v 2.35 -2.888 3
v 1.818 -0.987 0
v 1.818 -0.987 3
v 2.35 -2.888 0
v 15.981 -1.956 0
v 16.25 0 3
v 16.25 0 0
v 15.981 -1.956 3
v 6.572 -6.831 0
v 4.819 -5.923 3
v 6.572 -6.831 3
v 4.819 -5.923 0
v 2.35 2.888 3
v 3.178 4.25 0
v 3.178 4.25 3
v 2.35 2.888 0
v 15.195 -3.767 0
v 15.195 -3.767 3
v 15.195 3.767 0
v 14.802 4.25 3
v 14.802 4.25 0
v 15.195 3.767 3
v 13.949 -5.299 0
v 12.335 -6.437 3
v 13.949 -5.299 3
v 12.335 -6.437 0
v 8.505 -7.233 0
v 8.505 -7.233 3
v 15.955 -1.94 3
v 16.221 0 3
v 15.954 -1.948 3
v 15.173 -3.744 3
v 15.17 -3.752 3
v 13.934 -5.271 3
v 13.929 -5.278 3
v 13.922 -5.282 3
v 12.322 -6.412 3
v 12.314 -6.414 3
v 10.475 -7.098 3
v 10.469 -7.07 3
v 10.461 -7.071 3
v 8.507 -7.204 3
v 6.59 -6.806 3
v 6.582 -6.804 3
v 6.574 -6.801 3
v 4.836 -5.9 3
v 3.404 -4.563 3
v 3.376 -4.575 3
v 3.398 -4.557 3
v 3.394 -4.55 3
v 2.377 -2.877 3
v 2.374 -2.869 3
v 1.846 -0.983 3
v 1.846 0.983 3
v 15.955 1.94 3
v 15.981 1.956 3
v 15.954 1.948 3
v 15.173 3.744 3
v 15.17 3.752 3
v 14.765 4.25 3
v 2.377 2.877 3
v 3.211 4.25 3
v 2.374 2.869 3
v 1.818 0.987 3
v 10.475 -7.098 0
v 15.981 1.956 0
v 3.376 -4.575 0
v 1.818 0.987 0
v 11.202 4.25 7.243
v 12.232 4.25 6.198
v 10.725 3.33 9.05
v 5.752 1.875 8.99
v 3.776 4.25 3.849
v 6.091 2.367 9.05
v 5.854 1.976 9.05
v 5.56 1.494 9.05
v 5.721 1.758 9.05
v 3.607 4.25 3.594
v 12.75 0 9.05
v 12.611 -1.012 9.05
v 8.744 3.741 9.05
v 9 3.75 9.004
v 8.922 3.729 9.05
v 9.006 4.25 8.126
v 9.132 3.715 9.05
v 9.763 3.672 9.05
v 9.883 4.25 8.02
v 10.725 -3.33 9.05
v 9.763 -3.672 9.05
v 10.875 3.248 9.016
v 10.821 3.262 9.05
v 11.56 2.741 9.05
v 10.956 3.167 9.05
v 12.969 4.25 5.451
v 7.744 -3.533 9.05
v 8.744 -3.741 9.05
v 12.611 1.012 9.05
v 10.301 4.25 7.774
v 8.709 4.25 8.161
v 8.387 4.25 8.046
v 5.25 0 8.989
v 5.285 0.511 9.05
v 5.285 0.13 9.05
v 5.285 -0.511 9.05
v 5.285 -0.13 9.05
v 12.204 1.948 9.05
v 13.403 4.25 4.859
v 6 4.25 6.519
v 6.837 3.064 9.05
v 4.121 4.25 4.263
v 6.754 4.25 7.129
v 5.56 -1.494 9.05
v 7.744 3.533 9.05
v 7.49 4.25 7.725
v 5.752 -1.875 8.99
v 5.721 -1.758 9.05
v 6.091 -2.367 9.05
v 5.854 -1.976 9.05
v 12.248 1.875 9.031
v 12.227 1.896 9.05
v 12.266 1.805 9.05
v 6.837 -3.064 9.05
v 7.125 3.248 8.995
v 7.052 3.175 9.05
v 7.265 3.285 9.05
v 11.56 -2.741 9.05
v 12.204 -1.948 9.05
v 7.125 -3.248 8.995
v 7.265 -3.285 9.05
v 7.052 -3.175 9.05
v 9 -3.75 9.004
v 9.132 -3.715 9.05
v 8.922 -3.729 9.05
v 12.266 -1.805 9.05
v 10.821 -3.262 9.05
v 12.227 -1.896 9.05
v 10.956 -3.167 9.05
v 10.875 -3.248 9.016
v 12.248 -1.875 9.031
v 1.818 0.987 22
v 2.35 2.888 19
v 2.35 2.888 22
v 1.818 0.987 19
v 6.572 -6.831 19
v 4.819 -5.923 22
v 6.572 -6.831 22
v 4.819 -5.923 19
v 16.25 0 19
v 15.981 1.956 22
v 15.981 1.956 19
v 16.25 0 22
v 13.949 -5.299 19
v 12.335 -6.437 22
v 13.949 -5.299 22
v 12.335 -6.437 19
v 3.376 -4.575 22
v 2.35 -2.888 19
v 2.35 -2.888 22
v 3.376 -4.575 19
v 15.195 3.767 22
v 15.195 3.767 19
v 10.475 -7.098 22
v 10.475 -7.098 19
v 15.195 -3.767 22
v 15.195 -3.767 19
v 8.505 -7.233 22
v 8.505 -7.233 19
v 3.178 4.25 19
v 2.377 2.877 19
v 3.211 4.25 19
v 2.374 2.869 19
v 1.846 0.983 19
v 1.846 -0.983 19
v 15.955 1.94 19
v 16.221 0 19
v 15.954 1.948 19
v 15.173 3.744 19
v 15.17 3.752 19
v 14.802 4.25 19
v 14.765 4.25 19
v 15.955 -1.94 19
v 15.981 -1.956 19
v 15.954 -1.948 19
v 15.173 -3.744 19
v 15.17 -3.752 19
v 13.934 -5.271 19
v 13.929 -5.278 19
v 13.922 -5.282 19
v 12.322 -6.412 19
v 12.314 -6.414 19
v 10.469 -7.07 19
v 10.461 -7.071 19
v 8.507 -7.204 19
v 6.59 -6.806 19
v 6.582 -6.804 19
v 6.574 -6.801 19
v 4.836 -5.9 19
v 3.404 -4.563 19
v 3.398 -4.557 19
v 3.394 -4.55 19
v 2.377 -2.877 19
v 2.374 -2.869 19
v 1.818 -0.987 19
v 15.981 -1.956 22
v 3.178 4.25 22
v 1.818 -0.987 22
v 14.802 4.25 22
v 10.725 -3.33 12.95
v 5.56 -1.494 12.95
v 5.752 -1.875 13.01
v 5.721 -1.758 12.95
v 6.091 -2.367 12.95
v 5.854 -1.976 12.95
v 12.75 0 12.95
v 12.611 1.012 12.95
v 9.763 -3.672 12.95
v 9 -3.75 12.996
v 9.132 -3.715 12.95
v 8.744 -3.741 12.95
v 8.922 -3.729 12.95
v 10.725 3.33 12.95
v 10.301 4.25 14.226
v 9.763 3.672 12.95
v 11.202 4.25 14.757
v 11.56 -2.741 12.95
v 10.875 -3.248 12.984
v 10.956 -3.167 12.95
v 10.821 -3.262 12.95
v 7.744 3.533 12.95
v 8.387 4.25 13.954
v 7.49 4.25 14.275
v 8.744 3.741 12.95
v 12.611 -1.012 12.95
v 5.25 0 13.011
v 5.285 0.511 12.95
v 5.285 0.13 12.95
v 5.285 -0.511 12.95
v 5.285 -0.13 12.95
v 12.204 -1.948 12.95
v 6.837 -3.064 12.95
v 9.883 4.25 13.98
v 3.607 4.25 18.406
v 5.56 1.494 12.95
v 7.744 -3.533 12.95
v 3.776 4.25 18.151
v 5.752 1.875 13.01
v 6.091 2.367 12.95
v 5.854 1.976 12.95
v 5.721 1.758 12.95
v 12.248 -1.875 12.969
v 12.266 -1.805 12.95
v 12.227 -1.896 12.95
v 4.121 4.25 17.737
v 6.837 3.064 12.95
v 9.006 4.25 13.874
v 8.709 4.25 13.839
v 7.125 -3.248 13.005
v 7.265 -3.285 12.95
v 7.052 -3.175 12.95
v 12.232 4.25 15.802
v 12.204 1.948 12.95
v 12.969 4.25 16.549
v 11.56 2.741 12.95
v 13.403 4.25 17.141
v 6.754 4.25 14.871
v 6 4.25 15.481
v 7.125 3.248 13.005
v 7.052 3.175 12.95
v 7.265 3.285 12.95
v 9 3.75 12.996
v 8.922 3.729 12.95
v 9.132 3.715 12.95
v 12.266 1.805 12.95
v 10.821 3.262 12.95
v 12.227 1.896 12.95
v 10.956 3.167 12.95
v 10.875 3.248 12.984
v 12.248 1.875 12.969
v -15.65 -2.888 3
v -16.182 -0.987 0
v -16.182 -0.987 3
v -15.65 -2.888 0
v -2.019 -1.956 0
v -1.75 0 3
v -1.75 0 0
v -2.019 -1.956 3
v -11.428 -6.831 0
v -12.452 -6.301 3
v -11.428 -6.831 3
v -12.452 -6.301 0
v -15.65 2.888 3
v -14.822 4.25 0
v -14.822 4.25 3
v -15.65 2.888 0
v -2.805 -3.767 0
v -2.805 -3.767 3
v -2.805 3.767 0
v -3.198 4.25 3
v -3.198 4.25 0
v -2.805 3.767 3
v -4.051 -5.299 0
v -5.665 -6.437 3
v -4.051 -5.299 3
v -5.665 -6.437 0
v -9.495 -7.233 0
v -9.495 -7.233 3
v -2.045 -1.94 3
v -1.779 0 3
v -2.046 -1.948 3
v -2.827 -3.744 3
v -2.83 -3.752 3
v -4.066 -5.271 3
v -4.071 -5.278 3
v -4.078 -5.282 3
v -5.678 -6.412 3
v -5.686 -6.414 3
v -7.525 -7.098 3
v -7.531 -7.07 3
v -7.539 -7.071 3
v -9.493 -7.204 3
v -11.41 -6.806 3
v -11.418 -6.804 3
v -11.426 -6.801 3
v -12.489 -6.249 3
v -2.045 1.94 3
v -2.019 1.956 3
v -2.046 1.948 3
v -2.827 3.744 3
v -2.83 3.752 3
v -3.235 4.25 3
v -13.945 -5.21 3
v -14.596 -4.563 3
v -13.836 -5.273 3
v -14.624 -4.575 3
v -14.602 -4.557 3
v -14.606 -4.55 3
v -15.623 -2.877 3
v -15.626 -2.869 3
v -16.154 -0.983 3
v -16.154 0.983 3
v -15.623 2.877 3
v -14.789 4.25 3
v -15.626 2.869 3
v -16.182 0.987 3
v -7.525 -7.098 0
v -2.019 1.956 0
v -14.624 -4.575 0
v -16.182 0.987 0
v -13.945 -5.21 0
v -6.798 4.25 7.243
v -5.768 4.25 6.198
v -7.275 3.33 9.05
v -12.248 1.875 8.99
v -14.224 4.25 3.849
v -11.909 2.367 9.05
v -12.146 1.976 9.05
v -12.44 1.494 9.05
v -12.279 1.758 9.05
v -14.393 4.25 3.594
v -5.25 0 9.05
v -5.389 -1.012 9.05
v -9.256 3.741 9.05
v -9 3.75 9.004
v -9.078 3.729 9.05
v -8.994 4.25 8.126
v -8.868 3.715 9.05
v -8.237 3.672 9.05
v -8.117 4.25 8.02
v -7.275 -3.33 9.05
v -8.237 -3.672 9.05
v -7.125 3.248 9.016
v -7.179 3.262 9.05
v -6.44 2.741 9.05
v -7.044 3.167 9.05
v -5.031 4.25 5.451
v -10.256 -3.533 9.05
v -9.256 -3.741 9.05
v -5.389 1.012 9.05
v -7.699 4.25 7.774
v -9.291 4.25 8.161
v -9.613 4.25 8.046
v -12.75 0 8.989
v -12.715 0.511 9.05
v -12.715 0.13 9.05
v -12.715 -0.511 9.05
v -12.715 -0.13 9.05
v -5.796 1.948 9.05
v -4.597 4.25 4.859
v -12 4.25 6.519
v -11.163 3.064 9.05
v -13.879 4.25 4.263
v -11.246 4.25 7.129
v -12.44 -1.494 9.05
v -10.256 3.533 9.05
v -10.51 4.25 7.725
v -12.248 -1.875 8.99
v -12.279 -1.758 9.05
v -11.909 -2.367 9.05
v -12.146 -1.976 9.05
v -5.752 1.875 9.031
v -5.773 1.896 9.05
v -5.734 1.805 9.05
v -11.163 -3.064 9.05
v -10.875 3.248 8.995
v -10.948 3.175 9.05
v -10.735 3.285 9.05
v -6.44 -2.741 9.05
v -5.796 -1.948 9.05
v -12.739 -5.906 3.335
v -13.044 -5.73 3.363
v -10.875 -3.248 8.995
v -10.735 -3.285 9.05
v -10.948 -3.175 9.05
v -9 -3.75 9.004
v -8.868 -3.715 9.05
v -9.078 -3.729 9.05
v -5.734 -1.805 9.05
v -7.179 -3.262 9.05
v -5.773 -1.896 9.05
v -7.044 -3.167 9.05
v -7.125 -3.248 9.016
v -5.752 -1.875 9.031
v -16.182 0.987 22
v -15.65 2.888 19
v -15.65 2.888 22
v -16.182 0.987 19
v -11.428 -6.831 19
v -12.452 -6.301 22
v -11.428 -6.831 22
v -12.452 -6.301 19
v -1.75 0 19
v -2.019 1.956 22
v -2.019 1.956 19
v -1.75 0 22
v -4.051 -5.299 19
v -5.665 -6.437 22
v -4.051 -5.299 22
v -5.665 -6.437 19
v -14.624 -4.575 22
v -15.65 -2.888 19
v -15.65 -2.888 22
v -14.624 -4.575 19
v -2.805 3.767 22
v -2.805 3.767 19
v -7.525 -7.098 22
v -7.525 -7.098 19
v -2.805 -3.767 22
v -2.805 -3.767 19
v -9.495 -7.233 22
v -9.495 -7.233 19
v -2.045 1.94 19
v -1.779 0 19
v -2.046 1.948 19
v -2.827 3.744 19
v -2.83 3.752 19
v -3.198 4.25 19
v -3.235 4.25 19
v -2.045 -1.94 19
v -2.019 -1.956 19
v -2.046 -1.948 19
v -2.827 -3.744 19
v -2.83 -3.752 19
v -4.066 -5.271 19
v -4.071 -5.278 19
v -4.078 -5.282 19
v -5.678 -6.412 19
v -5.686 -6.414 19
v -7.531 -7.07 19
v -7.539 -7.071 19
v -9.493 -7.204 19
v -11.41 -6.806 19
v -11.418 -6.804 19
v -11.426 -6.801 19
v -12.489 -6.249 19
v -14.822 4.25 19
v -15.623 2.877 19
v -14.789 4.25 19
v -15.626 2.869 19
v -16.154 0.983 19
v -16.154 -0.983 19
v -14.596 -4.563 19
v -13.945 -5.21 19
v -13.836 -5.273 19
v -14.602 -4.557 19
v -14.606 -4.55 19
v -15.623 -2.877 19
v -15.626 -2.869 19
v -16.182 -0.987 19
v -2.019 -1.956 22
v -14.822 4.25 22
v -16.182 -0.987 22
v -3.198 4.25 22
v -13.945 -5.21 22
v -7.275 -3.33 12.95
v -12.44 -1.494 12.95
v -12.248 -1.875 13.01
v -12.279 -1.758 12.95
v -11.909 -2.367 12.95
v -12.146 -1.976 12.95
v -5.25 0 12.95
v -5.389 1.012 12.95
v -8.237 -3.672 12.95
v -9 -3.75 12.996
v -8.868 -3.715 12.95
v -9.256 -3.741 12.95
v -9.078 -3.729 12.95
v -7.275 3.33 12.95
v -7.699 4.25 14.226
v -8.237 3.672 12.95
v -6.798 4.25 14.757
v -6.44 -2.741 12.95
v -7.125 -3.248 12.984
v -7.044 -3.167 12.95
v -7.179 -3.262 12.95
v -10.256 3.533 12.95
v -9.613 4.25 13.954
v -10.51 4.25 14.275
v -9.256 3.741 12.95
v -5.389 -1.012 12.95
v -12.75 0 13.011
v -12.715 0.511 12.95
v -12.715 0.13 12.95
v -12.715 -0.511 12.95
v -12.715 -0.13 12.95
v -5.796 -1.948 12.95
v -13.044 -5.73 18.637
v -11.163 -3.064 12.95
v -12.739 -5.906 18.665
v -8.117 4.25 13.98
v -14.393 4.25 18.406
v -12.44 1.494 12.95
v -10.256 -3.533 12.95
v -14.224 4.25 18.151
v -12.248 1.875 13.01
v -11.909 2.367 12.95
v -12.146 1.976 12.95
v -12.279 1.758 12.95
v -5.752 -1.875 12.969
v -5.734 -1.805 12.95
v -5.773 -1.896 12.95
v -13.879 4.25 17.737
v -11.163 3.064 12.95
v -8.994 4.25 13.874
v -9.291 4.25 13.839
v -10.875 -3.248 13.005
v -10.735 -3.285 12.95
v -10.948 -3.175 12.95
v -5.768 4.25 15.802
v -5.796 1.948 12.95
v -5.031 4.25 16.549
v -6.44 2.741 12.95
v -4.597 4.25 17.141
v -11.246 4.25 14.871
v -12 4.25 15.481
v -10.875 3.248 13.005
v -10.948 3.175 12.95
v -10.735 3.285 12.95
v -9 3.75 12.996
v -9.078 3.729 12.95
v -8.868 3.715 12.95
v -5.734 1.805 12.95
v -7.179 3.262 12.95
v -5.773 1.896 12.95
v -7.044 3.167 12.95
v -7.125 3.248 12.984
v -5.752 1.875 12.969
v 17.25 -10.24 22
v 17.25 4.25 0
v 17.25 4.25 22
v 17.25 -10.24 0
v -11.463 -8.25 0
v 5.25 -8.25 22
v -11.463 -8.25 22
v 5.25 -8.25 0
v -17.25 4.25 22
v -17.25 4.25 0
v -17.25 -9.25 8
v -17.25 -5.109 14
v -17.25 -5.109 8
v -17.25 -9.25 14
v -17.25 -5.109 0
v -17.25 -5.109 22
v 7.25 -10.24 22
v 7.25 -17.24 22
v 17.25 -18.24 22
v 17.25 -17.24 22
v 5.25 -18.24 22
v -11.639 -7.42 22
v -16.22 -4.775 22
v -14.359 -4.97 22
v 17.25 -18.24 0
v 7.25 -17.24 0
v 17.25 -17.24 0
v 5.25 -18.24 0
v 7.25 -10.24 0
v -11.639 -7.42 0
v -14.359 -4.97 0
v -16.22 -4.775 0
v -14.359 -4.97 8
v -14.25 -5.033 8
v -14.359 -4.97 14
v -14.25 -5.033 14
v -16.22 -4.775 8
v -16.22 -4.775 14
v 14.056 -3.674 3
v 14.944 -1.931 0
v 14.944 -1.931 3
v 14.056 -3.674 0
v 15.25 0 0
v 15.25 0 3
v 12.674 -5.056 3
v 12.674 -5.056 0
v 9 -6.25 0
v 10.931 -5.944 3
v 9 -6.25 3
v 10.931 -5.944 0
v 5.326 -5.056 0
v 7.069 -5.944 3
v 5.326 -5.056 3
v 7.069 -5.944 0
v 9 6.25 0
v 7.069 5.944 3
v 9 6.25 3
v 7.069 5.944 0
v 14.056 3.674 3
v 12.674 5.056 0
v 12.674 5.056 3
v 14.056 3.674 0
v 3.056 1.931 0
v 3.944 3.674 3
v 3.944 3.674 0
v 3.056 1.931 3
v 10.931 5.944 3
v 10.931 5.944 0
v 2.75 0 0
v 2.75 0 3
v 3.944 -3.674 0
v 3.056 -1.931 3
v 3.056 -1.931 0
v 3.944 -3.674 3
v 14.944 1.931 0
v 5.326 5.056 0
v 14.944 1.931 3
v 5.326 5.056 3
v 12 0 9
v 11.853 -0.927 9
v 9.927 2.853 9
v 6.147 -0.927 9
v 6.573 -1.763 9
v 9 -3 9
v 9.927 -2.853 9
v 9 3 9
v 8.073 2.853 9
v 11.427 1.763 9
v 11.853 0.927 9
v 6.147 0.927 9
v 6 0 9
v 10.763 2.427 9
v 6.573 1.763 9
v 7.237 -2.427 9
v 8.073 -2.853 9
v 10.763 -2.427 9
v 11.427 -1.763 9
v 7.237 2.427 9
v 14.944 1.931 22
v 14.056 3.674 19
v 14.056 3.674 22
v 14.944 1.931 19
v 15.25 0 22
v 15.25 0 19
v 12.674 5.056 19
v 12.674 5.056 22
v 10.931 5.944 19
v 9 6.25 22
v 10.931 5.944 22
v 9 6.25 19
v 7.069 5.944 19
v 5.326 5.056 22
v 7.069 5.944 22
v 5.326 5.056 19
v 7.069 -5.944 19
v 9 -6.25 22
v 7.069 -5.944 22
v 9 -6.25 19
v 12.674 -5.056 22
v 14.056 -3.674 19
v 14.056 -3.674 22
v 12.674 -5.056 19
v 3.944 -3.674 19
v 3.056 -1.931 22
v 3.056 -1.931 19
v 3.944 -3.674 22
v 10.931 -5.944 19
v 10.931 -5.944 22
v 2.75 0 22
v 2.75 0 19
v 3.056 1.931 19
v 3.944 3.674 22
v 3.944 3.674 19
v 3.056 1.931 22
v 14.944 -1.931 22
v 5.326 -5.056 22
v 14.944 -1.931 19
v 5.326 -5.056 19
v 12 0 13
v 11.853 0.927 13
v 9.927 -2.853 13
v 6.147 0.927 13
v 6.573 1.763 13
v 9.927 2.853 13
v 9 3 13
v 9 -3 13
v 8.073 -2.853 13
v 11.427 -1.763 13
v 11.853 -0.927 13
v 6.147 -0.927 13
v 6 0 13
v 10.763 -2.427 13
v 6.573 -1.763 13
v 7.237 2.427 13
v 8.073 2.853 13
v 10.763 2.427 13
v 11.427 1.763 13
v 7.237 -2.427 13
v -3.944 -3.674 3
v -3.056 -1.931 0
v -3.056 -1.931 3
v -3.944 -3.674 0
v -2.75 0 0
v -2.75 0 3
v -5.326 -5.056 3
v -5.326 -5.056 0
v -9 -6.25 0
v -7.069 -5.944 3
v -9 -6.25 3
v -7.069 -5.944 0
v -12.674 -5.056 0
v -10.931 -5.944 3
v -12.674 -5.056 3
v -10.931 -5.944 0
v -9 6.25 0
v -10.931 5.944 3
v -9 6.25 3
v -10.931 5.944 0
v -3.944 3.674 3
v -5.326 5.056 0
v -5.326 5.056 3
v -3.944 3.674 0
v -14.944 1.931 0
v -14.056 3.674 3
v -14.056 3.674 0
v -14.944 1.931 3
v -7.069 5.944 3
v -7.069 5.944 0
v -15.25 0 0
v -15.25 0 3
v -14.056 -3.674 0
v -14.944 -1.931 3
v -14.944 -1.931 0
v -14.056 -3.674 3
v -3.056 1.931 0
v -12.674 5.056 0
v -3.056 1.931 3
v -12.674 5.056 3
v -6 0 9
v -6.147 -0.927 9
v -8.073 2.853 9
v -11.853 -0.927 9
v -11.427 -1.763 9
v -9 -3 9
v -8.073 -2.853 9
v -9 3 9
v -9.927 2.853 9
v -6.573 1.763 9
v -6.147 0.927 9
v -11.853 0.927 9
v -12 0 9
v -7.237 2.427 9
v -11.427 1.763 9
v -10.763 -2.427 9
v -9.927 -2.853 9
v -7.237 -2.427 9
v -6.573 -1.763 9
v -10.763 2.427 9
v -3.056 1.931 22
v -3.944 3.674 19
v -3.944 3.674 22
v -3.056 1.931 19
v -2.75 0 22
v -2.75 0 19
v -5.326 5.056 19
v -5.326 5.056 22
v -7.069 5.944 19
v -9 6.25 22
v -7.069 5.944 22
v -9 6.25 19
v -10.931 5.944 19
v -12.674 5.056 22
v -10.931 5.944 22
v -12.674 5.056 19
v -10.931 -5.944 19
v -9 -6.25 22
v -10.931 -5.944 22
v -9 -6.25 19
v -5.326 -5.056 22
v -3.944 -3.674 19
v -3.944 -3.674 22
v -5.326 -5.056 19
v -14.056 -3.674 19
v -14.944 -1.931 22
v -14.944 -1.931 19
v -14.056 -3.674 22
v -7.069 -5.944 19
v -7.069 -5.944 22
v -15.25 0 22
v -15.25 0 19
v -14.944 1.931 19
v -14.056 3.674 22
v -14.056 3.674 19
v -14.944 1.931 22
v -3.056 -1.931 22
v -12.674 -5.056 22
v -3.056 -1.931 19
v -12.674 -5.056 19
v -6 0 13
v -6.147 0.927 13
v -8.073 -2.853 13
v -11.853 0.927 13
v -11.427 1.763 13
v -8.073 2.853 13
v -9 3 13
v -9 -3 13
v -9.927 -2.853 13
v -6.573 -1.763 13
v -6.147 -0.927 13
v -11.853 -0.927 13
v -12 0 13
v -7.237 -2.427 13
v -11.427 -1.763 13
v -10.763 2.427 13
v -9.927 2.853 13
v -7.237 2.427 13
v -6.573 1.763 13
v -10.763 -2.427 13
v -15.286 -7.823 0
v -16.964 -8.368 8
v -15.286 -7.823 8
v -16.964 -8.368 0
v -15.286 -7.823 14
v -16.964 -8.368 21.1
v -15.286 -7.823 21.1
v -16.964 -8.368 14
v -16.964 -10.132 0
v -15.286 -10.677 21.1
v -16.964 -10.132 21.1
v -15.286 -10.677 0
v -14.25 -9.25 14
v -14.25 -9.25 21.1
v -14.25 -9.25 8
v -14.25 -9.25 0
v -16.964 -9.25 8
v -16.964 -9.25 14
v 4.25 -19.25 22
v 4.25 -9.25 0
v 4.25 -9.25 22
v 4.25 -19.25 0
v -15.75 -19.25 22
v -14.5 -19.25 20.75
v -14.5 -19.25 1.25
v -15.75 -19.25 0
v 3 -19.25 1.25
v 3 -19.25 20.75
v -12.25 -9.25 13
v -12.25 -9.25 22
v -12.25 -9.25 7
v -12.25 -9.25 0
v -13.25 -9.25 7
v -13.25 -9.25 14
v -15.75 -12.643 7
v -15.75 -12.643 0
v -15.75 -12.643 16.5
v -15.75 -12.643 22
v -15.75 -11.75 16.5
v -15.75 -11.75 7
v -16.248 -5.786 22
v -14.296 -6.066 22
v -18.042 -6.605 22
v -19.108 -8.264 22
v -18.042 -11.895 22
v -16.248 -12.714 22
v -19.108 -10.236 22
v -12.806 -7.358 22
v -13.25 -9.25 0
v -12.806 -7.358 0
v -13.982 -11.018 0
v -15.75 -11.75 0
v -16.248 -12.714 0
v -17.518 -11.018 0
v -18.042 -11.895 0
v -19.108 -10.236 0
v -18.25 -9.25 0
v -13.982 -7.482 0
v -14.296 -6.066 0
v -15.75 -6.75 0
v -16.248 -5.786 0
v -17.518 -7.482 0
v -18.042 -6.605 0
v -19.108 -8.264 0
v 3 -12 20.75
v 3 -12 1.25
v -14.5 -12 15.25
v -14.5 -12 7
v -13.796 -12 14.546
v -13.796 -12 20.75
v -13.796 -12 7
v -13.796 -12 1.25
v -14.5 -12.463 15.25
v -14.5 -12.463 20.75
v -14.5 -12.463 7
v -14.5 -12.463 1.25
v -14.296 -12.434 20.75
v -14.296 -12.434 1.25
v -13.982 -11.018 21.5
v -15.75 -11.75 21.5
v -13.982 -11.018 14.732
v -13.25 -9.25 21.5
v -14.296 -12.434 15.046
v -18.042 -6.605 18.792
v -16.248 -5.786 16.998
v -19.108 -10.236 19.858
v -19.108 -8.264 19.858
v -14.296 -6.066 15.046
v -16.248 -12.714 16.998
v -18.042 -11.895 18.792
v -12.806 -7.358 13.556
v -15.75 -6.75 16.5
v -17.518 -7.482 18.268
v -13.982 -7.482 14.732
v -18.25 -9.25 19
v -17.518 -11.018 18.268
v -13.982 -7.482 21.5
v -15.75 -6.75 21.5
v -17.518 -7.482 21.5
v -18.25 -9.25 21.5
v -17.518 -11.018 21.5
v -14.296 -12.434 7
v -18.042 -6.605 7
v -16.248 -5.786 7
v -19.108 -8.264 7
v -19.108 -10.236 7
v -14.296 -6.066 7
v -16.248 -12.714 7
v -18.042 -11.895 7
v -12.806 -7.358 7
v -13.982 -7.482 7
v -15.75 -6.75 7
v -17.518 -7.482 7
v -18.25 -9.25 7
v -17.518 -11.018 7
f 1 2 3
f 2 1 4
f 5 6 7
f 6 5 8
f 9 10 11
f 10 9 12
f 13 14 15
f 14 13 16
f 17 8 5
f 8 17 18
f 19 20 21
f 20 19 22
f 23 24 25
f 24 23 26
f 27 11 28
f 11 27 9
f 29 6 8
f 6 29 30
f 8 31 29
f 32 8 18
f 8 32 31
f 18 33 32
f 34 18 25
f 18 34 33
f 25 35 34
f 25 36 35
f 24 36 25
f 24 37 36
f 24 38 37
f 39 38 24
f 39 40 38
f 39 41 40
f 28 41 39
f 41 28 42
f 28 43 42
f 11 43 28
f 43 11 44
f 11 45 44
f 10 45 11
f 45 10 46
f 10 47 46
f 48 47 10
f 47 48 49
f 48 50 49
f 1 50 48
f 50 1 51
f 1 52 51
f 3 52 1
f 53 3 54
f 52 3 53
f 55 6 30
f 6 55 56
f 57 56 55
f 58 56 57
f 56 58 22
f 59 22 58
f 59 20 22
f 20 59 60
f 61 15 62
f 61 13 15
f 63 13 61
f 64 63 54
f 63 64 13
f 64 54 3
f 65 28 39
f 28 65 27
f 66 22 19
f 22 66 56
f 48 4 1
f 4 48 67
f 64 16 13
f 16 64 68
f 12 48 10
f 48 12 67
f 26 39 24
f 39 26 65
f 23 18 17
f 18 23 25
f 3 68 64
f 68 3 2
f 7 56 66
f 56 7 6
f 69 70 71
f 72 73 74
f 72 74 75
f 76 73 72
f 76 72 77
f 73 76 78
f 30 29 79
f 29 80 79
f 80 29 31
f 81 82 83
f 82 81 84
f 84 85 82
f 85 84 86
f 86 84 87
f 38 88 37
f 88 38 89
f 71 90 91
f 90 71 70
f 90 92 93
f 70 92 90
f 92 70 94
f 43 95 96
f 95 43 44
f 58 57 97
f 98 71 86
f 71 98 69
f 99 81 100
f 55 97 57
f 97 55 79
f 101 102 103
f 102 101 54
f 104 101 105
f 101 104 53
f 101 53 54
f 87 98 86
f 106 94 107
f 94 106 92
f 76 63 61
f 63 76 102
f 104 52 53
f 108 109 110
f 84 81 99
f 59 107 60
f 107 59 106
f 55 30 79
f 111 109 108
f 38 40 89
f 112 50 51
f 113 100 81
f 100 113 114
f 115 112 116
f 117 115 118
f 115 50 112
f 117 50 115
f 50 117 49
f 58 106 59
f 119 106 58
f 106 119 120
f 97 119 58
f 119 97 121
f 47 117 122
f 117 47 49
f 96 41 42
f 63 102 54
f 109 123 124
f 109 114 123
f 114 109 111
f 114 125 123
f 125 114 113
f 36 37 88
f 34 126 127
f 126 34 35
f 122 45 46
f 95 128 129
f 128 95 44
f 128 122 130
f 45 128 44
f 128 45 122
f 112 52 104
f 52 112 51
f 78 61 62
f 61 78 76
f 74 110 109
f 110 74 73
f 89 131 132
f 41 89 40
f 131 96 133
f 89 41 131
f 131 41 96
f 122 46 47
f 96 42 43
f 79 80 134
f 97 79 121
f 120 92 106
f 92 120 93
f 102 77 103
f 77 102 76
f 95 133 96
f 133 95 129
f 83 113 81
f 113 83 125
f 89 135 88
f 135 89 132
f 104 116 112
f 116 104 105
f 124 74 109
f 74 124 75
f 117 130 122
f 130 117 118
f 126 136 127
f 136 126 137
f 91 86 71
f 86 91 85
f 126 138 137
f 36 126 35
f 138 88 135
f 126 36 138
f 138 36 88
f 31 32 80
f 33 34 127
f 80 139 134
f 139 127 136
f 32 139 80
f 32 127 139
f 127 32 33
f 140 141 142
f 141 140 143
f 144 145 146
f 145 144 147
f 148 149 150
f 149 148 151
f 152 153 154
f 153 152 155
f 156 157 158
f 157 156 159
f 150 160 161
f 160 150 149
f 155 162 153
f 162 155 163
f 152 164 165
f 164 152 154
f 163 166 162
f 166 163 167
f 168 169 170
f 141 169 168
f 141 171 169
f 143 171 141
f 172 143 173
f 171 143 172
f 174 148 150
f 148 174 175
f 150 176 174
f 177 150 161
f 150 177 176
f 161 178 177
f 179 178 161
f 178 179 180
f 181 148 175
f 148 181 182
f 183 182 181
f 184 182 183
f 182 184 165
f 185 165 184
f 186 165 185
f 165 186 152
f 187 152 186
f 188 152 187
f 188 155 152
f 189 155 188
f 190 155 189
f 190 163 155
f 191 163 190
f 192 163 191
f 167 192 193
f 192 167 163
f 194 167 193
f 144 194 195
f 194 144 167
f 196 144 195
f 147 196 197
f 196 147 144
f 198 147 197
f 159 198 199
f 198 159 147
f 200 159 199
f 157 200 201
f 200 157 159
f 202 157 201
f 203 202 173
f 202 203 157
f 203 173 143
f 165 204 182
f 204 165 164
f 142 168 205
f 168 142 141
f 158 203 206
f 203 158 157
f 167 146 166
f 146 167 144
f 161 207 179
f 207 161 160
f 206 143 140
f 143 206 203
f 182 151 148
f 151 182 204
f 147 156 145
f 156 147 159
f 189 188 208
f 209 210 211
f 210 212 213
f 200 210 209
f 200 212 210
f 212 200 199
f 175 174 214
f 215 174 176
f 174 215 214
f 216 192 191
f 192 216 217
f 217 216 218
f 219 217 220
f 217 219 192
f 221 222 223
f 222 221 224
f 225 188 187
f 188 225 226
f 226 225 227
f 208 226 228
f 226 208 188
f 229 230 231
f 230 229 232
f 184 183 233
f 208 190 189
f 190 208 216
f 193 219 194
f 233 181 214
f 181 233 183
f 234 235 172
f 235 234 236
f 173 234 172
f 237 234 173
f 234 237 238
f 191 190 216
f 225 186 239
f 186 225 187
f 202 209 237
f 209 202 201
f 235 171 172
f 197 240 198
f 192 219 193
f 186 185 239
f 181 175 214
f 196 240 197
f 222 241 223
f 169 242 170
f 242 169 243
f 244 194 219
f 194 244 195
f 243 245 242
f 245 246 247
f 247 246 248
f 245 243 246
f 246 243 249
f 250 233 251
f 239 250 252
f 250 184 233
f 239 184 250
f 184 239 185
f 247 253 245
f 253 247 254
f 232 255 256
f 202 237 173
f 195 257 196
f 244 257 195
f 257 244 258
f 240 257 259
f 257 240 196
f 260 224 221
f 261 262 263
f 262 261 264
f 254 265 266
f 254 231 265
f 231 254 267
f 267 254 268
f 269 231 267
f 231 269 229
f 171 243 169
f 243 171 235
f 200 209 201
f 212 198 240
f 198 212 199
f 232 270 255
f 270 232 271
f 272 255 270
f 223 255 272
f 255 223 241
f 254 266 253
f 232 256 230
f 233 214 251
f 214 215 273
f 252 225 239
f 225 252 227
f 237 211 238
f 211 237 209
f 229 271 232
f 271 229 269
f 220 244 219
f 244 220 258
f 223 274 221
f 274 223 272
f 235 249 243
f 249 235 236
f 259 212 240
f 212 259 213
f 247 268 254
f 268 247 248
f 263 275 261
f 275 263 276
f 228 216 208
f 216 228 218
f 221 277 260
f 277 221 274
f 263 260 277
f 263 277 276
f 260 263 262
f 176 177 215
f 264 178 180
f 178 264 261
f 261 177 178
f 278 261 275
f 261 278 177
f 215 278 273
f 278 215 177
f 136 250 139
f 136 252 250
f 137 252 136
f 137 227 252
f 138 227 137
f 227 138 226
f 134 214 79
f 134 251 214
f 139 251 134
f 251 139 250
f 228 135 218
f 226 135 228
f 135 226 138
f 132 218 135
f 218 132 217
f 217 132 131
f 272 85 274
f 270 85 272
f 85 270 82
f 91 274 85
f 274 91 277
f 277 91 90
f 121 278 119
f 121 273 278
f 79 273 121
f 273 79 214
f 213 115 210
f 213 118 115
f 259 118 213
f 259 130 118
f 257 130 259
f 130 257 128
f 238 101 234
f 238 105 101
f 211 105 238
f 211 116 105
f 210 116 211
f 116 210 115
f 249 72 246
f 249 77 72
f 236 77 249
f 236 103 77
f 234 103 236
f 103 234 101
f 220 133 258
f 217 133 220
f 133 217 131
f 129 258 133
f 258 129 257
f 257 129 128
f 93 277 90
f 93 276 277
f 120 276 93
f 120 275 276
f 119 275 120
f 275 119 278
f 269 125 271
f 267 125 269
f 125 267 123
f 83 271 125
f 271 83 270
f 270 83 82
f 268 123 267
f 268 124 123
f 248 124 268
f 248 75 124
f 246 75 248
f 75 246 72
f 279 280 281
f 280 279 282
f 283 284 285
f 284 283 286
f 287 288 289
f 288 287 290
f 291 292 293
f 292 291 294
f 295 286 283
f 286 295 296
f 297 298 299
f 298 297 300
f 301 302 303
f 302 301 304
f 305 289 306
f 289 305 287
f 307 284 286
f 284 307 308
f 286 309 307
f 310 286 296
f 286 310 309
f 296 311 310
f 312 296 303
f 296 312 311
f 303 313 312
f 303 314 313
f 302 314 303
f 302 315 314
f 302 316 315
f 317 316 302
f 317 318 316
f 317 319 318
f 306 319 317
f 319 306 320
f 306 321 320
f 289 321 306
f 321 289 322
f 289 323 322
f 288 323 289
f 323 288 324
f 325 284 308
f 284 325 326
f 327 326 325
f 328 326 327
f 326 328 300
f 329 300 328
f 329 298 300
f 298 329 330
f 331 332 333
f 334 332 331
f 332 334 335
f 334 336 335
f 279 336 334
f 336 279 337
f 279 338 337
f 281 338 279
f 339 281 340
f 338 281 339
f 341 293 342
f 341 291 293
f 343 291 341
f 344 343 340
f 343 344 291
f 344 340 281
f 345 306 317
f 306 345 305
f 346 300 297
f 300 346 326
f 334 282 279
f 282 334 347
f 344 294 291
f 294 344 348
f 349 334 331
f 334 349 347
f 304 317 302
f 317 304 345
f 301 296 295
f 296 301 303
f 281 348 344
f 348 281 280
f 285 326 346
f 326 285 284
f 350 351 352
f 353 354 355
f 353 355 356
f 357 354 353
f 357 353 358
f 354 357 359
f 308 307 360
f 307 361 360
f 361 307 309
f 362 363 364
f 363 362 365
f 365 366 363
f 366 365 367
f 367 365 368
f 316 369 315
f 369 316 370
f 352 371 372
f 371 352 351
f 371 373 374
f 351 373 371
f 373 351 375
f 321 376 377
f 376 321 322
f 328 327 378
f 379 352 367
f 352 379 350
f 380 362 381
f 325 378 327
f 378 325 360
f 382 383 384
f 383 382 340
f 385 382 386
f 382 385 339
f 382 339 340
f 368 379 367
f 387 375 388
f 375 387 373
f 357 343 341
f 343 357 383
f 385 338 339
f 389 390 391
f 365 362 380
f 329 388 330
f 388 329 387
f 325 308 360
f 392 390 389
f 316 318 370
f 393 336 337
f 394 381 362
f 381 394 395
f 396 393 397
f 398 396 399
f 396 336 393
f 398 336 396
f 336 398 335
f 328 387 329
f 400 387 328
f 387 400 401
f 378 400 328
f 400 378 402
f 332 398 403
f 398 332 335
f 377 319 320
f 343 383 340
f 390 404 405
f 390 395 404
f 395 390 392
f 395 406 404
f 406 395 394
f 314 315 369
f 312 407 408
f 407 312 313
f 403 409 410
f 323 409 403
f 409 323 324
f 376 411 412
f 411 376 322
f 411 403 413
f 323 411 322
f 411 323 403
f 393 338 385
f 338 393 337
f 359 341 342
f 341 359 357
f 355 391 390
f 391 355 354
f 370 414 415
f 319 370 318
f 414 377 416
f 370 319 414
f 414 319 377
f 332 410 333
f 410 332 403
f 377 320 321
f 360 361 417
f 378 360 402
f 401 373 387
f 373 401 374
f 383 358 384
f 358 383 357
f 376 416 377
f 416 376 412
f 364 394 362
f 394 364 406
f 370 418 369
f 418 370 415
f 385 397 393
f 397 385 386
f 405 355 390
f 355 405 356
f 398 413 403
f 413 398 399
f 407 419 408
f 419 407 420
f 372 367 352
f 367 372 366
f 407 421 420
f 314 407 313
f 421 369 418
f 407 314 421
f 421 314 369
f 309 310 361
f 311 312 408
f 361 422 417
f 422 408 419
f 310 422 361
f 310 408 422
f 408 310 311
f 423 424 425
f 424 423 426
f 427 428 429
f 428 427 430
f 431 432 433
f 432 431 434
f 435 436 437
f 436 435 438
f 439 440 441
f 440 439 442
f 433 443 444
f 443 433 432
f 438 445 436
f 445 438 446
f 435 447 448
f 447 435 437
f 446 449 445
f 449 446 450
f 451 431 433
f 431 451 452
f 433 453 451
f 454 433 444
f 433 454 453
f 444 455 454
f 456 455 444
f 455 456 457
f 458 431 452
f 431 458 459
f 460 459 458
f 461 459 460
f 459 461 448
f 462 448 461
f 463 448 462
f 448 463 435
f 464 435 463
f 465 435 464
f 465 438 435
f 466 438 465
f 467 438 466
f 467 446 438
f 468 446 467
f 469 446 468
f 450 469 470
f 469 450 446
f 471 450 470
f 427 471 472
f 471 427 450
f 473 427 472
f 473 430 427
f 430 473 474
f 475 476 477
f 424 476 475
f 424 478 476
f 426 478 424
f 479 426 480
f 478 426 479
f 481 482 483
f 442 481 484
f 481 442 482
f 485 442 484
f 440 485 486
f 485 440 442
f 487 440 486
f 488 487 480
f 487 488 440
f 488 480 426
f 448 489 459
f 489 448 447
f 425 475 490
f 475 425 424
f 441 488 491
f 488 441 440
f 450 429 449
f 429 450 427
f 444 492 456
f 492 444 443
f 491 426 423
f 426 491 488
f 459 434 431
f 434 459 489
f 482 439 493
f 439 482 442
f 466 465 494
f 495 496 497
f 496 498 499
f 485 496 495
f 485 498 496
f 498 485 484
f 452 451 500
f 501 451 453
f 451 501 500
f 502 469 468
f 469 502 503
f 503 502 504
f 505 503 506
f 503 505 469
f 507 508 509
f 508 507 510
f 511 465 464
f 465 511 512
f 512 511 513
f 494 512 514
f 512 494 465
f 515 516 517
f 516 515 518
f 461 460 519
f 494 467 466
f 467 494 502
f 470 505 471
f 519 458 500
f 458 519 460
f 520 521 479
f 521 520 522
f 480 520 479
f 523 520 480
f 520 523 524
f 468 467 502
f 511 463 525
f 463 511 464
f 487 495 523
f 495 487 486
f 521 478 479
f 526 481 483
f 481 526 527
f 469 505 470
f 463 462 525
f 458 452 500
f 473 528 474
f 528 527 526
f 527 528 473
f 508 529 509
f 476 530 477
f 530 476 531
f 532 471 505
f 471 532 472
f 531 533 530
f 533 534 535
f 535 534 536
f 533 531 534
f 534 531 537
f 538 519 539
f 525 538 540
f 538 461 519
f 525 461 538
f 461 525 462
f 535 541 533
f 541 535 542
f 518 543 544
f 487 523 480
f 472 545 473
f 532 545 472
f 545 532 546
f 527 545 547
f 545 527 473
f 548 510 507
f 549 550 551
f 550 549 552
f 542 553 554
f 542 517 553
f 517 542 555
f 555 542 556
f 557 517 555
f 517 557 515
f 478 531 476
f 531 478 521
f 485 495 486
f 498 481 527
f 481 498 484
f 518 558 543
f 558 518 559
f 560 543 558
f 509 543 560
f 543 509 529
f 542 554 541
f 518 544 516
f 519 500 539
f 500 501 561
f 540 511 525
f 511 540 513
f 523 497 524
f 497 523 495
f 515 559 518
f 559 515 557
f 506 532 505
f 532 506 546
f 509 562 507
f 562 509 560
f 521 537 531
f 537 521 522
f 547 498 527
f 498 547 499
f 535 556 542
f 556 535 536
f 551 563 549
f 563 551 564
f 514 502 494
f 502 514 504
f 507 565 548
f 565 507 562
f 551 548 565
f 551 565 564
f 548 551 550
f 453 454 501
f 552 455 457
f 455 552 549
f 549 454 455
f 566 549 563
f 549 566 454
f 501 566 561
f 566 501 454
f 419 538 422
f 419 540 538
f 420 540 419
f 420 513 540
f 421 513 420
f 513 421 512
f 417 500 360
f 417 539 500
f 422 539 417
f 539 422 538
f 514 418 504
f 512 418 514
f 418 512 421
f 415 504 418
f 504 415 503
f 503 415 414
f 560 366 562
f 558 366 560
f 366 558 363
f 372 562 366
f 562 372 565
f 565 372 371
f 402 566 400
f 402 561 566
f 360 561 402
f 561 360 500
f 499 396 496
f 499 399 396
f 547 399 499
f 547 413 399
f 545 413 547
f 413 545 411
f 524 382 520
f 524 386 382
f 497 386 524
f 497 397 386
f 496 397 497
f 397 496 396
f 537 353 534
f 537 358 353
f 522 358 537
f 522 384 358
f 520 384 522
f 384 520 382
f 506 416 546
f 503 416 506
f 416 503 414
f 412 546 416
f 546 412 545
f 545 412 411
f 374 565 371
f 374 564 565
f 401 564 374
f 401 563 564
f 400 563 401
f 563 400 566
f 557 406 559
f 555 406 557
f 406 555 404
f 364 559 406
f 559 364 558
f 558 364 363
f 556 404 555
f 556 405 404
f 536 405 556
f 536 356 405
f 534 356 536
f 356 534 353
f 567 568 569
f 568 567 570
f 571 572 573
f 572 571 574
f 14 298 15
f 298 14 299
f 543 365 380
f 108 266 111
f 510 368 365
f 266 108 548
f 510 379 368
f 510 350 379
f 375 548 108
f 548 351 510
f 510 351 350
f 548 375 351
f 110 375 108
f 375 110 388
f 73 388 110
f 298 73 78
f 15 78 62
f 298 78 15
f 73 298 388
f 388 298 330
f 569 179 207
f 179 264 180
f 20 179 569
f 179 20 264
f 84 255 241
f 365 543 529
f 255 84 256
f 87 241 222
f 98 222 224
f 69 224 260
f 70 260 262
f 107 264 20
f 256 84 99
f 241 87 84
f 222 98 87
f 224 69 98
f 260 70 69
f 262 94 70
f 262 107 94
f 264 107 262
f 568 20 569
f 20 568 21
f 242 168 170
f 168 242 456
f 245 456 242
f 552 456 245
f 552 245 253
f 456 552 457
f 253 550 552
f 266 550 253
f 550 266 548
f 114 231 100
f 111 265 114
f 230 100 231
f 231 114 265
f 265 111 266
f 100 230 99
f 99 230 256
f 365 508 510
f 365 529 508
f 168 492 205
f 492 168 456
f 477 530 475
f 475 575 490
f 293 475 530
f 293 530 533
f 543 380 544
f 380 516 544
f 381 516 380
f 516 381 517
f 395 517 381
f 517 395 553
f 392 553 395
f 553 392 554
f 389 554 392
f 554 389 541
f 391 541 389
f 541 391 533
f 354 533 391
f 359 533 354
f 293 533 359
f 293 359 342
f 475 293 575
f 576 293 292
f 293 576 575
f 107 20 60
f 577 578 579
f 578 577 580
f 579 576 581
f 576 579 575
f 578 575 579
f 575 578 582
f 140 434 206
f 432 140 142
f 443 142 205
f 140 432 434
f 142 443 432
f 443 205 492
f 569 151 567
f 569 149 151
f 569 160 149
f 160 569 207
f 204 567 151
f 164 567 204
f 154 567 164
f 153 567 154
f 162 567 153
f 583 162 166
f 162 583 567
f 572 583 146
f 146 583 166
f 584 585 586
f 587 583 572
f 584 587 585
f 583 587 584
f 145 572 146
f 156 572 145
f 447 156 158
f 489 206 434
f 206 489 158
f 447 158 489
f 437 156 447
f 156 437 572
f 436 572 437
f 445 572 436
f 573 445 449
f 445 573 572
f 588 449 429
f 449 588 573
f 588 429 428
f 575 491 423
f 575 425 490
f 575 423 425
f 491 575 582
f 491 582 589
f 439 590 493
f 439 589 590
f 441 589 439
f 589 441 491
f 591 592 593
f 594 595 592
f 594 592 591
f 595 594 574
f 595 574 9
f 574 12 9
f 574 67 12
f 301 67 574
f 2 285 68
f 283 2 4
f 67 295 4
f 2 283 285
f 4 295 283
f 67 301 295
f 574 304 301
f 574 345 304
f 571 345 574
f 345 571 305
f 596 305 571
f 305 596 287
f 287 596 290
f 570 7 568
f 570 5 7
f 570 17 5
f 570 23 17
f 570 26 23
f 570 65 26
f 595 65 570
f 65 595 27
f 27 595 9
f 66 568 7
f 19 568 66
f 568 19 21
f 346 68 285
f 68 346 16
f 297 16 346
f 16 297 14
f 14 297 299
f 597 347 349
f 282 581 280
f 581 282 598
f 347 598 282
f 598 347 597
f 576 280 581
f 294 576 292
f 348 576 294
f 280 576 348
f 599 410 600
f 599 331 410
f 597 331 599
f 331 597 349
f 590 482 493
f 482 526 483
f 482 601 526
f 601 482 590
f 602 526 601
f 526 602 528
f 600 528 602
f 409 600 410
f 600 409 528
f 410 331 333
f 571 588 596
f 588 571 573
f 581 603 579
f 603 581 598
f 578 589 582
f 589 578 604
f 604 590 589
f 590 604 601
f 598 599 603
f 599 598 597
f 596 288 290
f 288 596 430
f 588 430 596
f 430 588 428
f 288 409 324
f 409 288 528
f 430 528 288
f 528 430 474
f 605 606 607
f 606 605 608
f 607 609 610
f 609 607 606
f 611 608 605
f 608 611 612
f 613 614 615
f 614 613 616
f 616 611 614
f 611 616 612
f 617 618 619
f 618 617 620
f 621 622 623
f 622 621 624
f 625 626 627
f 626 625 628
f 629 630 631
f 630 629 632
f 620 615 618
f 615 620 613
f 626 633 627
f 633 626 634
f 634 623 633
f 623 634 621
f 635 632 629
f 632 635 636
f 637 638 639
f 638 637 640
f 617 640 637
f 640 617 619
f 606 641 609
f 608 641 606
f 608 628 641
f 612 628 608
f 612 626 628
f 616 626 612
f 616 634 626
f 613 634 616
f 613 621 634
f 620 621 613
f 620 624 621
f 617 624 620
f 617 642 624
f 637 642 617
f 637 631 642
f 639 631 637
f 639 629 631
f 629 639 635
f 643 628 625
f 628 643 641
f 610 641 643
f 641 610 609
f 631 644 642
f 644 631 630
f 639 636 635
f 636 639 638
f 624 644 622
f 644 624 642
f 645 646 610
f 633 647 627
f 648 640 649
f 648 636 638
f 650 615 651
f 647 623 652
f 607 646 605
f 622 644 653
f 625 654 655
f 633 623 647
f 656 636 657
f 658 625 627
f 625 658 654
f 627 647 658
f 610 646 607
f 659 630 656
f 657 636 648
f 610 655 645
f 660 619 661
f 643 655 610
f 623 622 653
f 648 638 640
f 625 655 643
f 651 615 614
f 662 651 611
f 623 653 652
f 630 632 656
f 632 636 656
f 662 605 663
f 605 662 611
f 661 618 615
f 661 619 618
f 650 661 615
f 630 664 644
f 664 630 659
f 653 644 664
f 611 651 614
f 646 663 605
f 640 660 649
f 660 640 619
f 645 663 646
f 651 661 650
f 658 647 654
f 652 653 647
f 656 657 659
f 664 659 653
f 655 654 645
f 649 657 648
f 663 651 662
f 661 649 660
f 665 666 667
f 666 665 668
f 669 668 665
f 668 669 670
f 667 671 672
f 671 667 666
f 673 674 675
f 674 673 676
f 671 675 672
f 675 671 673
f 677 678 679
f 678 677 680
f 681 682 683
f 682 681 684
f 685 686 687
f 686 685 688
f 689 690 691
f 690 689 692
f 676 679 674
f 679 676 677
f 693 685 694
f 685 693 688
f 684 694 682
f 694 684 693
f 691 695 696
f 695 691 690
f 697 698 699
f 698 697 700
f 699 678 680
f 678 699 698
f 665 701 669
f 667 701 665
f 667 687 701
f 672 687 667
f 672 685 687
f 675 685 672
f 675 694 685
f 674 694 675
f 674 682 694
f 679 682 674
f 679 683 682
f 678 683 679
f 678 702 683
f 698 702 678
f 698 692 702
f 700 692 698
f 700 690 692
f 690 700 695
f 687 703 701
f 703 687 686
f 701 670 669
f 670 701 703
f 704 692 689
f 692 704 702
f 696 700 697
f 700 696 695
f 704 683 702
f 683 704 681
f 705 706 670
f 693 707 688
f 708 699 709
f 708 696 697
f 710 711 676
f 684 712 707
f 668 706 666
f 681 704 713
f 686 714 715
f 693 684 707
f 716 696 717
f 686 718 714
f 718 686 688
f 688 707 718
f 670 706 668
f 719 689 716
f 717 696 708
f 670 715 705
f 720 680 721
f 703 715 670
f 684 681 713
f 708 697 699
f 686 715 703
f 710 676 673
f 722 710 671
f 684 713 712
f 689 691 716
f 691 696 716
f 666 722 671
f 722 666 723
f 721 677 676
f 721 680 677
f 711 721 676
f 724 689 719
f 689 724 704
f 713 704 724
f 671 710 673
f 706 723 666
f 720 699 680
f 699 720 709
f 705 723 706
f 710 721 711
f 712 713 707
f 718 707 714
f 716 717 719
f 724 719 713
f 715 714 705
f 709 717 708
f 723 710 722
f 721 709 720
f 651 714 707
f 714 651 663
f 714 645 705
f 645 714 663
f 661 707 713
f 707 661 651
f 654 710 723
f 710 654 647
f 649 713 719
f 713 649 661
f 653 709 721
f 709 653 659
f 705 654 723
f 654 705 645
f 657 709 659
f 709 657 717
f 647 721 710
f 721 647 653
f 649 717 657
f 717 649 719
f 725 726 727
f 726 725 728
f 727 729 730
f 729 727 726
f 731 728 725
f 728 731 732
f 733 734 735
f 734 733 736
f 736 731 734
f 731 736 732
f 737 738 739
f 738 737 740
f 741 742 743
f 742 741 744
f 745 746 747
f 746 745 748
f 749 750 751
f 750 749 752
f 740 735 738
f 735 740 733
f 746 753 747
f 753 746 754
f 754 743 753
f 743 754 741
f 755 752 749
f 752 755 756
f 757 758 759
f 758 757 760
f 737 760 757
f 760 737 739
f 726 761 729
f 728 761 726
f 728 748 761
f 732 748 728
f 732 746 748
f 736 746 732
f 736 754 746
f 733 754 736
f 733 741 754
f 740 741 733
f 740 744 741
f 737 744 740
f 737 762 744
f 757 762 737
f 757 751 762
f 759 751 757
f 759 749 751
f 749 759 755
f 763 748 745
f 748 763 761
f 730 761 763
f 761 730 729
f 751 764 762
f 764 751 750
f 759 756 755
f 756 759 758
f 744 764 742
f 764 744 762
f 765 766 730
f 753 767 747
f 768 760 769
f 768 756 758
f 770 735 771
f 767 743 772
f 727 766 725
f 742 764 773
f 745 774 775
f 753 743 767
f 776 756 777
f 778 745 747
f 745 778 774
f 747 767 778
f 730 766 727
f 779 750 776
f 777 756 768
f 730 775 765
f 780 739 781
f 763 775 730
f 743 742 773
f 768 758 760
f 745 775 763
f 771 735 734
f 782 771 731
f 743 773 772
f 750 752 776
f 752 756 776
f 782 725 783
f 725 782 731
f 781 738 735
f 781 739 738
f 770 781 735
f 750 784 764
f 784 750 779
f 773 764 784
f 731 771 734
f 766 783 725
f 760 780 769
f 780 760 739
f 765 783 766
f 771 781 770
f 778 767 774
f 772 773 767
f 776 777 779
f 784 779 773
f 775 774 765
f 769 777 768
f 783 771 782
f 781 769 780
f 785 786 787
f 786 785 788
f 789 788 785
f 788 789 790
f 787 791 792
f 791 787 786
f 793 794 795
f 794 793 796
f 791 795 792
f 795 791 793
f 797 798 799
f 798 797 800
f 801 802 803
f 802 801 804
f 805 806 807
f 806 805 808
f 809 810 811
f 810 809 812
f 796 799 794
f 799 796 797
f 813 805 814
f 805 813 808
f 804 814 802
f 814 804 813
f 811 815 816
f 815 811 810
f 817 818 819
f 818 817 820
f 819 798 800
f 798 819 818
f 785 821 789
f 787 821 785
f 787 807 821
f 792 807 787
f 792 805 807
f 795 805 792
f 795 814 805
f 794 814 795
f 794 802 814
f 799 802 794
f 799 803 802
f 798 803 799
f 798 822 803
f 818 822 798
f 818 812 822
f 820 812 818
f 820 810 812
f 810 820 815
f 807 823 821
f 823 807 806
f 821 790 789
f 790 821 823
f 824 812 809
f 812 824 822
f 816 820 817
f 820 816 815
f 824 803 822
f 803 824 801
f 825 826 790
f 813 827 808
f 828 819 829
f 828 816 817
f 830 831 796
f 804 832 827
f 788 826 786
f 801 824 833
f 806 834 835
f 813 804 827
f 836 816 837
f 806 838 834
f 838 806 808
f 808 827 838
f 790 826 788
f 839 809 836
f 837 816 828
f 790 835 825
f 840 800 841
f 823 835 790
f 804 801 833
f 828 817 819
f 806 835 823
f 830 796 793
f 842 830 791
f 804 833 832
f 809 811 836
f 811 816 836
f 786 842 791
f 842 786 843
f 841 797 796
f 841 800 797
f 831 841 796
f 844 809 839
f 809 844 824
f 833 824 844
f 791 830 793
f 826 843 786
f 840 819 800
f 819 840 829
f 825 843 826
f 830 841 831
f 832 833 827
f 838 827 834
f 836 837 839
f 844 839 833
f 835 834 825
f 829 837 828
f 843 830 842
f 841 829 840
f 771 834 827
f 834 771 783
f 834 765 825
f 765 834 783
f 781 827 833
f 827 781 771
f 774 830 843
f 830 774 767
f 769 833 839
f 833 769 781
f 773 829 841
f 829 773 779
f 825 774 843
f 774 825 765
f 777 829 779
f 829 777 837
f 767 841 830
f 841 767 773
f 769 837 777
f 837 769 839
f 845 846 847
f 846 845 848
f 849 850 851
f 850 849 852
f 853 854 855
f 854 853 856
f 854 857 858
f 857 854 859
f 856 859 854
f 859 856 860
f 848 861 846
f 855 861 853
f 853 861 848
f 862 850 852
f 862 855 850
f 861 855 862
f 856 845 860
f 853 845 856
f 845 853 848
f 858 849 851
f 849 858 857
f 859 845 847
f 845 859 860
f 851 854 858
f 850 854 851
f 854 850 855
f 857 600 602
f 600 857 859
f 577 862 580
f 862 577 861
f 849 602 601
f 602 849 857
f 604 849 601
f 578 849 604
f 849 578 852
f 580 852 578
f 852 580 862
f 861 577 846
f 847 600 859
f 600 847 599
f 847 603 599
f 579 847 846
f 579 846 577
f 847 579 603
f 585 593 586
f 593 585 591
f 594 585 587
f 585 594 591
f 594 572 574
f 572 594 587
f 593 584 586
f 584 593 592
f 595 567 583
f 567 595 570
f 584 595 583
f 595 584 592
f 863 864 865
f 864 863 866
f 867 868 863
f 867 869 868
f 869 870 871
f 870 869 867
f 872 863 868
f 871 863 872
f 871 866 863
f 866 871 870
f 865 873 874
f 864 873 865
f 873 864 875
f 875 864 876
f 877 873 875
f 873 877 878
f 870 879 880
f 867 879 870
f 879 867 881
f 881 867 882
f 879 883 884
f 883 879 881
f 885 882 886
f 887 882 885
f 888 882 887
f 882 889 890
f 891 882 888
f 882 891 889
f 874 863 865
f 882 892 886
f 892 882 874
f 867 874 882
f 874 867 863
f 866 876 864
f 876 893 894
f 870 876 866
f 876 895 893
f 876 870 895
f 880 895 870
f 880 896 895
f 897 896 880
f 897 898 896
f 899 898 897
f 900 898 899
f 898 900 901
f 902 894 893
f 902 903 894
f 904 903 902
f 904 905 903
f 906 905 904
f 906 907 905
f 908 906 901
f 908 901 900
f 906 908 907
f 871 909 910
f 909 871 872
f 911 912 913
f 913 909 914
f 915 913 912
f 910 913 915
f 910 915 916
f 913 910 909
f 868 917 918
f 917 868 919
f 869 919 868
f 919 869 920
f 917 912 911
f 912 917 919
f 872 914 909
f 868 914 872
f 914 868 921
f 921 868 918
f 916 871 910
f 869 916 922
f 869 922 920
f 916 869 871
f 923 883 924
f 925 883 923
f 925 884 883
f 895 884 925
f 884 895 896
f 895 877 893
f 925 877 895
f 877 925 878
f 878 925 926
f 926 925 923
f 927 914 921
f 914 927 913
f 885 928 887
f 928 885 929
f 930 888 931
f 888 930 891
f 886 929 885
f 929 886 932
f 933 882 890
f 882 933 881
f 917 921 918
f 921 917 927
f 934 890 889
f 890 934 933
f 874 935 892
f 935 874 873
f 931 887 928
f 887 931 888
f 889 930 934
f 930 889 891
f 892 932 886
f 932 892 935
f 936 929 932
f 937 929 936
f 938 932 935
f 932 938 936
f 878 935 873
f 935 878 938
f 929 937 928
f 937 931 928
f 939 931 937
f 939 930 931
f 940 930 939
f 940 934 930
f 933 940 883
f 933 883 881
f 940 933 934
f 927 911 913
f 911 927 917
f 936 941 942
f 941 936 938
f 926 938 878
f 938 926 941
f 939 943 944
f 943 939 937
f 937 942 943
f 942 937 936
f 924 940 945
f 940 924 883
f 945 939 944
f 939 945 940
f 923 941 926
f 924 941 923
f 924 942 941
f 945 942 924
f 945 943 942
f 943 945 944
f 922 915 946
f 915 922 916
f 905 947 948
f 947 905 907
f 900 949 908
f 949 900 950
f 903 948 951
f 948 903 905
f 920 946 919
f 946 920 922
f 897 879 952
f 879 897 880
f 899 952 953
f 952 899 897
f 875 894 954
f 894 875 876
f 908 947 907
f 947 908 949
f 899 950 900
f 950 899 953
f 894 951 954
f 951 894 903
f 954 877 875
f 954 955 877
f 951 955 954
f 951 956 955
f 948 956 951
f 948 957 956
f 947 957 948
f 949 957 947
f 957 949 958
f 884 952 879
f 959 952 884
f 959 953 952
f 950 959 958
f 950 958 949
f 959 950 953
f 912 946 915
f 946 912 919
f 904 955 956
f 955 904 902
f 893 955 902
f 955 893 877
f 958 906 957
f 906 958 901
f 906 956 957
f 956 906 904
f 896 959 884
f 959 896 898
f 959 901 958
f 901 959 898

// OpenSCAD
// Tiny Toy Dump Truck
// No support needed, no assembly required (*)
// (*) some cleanup will probably be necessary, however
// Created by: Madscifi
// License - Public domain
// Inspired by (but not really derived from)
// toy tanker truck by jag (thingiverse thing:5273)

// Sliced with Skeinforge using:
//  0.2mm - Layer Thickness
//  2.5 - Perimeter Width over Thickness (ratio)

// V3 modified bed axle so that the bed does not slide so far off the truck 
// when it is raised.

// V2	moved support_width definition to the start of the script, and fixed the positioning of the cab
//	so it is positioned correctly in the case that wheel_dia or bed_lift is modified.
//	As delivered, this version prints essentially the same as the previous version unless
//	you modify wheel_dia or bed_lift.

wheel_dia=12.5;
wheel_flat_thickness=3;
wheel_conic_dist=6;
wheel_base_dist=18;
wheel_cutout_extra=1;
axle_cutout=0.75;
axle_dia=6;
axle_len=4;
body_lift=2;
bed_axle_dia=3;
bed_axle_cutout=1;
bed_axle_bearing_extra=1;
bed_height=10;
bed_len=20;
bed_wall=2.5;
bed_axle_bearing_wall=1;
bed_bearing_cutout=1;
bed_axle_cover_height = 0.5;
bed_axle_cover_clearance = 0.4;
bed_axle_short = bed_axle_cover_height + bed_axle_cover_clearance;
cab_sep=1;
cab_wall=2;
cab_roof=1;
support_width=6;

width=wheel_flat_thickness*2+wheel_conic_dist*2+axle_len;
length=wheel_base_dist+wheel_dia+wheel_cutout_extra*4;
bearing_dia=bed_axle_dia+bed_axle_cutout*2+bed_axle_bearing_wall*2;

// If you change the size of things this is the one value that is 
// completely emperical - you'll probably need to tweek this.
bed_axle_slice_offset=-width/4+support_width/2+bed_axle_cutout*2.5;

module wheel(extra,aextra)
{
	union()
	{
		translate([0,0,wheel_conic_dist]) cylinder(h=wheel_flat_thickness+extra,r=wheel_dia/2+extra);
		translate([0,0,-extra/20]) cylinder(h=wheel_conic_dist+extra/10,r1=axle_dia/2+aextra,r2=wheel_dia/2+extra);
	}
}
module axle(extra,aextra)
{
	union()
	{
		translate([0,-axle_len/2,0]) rotate([90,0,0]) wheel(extra,aextra);
		translate([0,axle_len/2,0]) rotate([-90,0,0]) wheel(extra,aextra);
		translate([0,axle_len/2+0.1,0]) rotate([90,0,0]) cylinder(h=axle_len+0.2,r=axle_dia/2+aextra);
	}
}


module bed()
{
	cutout_dia = bed_axle_dia+bed_axle_cutout*2;
	bearing_len=width/2-support_width/2-bed_axle_cutout;

	union()
	{
		difference()
		{
			translate([bed_len/2,0,bed_height/2]) 
				cube([bed_len,width,bed_height],center=true);
			translate([bed_len/2,0,bed_height/2+bed_axle_dia/2]) 
				cube([bed_len-bed_wall,width-bed_wall,bed_height-bed_wall],center=true);
			rotate([90,0,0]) cylinder(h=width+0.01,r=cutout_dia/2,center=true);
		}
		difference()
		{
			translate([0, width/4,0]) 
			difference()
			{
				rotate([90,0,0]) cylinder( h=width/2,r=bearing_dia/2,center=true);
				translate([0,bed_axle_slice_offset,0]) 
					rotate([0,0,45]) translate([-50,0,0]) 
						cube([100,100,100],center=true);
			}
			translate([0,-bed_axle_cover_height,0])
			    rotate([90,0,0]) 
                                      cylinder( h=width, r=cutout_dia/2, center=true);
			
		}
		difference()
		{
			translate([0, -bearing_len/2-support_width/2-bed_axle_cutout,0]) 
				rotate([90,0,0]) 
					cylinder( h=bearing_len,r=bearing_dia/2,center=true);
			rotate([90,0,0]) cylinder( h=width+0.2, r=cutout_dia/2, center=true);
		}
	}
}

module bed_axle()
{
	union()
	{
		translate([0,-bed_axle_short/2,0])
		    rotate([90,0,0]) 
          	        cylinder(h=width-bed_axle_short,r=bed_axle_dia/2,center=true);
		translate([0,0,-bed_axle_dia]) cube([bed_axle_dia,6,bed_axle_dia*2],center=true);
	}
}

module bed_axle_cutout()
{
	rotate([90,0,0]) cylinder(h=width+0.1,r=bearing_dia/2+bed_bearing_cutout,center=true);
}

module cab()
{
	translate([-(length-bed_len-bed_axle_dia/2-cab_sep)/2,0,bed_height/2])
	difference()
	{
		cube([length-bed_len-bed_axle_dia/2-cab_sep,width,bed_height],center=true);
		translate([cab_wall,0,(cab_wall-cab_roof)/2]) cube([length-bed_len-bed_axle_dia/2-cab_sep,width+0.1,bed_height-cab_wall-cab_roof],center=true);
	}
}

translate([0,0,width/2])
rotate([90,0,0])
{
	union()
	{
		// body
		difference()
		{
			translate([0,0,body_lift]) cube([length,width,wheel_dia],center=true);
			translate([wheel_base_dist/2,0,0]) axle(wheel_cutout_extra,axle_cutout);
			translate([-wheel_base_dist/2,0,0]) axle(wheel_cutout_extra,axle_cutout);
			translate([-length/2+bed_axle_dia/2,0,wheel_dia/2+body_lift+1]) bed_axle_cutout();
		}
		
		// wheels and axles
		translate([wheel_base_dist/2,0,0]) axle(0,0);
		translate([-wheel_base_dist/2,0,0]) axle(0,0);
	
		// bed
		translate([-length/2+bed_axle_dia/2,0,wheel_dia/2+body_lift+1]) 
		{
			bed_axle();
		}
	
		// cab
		translate([(length/2),0,wheel_dia/2+body_lift-0.01]) cab();
		translate([-length/2+bed_axle_dia/2,0,wheel_dia/2+body_lift+1]) 
		{
			bed();
		}
	}
}
